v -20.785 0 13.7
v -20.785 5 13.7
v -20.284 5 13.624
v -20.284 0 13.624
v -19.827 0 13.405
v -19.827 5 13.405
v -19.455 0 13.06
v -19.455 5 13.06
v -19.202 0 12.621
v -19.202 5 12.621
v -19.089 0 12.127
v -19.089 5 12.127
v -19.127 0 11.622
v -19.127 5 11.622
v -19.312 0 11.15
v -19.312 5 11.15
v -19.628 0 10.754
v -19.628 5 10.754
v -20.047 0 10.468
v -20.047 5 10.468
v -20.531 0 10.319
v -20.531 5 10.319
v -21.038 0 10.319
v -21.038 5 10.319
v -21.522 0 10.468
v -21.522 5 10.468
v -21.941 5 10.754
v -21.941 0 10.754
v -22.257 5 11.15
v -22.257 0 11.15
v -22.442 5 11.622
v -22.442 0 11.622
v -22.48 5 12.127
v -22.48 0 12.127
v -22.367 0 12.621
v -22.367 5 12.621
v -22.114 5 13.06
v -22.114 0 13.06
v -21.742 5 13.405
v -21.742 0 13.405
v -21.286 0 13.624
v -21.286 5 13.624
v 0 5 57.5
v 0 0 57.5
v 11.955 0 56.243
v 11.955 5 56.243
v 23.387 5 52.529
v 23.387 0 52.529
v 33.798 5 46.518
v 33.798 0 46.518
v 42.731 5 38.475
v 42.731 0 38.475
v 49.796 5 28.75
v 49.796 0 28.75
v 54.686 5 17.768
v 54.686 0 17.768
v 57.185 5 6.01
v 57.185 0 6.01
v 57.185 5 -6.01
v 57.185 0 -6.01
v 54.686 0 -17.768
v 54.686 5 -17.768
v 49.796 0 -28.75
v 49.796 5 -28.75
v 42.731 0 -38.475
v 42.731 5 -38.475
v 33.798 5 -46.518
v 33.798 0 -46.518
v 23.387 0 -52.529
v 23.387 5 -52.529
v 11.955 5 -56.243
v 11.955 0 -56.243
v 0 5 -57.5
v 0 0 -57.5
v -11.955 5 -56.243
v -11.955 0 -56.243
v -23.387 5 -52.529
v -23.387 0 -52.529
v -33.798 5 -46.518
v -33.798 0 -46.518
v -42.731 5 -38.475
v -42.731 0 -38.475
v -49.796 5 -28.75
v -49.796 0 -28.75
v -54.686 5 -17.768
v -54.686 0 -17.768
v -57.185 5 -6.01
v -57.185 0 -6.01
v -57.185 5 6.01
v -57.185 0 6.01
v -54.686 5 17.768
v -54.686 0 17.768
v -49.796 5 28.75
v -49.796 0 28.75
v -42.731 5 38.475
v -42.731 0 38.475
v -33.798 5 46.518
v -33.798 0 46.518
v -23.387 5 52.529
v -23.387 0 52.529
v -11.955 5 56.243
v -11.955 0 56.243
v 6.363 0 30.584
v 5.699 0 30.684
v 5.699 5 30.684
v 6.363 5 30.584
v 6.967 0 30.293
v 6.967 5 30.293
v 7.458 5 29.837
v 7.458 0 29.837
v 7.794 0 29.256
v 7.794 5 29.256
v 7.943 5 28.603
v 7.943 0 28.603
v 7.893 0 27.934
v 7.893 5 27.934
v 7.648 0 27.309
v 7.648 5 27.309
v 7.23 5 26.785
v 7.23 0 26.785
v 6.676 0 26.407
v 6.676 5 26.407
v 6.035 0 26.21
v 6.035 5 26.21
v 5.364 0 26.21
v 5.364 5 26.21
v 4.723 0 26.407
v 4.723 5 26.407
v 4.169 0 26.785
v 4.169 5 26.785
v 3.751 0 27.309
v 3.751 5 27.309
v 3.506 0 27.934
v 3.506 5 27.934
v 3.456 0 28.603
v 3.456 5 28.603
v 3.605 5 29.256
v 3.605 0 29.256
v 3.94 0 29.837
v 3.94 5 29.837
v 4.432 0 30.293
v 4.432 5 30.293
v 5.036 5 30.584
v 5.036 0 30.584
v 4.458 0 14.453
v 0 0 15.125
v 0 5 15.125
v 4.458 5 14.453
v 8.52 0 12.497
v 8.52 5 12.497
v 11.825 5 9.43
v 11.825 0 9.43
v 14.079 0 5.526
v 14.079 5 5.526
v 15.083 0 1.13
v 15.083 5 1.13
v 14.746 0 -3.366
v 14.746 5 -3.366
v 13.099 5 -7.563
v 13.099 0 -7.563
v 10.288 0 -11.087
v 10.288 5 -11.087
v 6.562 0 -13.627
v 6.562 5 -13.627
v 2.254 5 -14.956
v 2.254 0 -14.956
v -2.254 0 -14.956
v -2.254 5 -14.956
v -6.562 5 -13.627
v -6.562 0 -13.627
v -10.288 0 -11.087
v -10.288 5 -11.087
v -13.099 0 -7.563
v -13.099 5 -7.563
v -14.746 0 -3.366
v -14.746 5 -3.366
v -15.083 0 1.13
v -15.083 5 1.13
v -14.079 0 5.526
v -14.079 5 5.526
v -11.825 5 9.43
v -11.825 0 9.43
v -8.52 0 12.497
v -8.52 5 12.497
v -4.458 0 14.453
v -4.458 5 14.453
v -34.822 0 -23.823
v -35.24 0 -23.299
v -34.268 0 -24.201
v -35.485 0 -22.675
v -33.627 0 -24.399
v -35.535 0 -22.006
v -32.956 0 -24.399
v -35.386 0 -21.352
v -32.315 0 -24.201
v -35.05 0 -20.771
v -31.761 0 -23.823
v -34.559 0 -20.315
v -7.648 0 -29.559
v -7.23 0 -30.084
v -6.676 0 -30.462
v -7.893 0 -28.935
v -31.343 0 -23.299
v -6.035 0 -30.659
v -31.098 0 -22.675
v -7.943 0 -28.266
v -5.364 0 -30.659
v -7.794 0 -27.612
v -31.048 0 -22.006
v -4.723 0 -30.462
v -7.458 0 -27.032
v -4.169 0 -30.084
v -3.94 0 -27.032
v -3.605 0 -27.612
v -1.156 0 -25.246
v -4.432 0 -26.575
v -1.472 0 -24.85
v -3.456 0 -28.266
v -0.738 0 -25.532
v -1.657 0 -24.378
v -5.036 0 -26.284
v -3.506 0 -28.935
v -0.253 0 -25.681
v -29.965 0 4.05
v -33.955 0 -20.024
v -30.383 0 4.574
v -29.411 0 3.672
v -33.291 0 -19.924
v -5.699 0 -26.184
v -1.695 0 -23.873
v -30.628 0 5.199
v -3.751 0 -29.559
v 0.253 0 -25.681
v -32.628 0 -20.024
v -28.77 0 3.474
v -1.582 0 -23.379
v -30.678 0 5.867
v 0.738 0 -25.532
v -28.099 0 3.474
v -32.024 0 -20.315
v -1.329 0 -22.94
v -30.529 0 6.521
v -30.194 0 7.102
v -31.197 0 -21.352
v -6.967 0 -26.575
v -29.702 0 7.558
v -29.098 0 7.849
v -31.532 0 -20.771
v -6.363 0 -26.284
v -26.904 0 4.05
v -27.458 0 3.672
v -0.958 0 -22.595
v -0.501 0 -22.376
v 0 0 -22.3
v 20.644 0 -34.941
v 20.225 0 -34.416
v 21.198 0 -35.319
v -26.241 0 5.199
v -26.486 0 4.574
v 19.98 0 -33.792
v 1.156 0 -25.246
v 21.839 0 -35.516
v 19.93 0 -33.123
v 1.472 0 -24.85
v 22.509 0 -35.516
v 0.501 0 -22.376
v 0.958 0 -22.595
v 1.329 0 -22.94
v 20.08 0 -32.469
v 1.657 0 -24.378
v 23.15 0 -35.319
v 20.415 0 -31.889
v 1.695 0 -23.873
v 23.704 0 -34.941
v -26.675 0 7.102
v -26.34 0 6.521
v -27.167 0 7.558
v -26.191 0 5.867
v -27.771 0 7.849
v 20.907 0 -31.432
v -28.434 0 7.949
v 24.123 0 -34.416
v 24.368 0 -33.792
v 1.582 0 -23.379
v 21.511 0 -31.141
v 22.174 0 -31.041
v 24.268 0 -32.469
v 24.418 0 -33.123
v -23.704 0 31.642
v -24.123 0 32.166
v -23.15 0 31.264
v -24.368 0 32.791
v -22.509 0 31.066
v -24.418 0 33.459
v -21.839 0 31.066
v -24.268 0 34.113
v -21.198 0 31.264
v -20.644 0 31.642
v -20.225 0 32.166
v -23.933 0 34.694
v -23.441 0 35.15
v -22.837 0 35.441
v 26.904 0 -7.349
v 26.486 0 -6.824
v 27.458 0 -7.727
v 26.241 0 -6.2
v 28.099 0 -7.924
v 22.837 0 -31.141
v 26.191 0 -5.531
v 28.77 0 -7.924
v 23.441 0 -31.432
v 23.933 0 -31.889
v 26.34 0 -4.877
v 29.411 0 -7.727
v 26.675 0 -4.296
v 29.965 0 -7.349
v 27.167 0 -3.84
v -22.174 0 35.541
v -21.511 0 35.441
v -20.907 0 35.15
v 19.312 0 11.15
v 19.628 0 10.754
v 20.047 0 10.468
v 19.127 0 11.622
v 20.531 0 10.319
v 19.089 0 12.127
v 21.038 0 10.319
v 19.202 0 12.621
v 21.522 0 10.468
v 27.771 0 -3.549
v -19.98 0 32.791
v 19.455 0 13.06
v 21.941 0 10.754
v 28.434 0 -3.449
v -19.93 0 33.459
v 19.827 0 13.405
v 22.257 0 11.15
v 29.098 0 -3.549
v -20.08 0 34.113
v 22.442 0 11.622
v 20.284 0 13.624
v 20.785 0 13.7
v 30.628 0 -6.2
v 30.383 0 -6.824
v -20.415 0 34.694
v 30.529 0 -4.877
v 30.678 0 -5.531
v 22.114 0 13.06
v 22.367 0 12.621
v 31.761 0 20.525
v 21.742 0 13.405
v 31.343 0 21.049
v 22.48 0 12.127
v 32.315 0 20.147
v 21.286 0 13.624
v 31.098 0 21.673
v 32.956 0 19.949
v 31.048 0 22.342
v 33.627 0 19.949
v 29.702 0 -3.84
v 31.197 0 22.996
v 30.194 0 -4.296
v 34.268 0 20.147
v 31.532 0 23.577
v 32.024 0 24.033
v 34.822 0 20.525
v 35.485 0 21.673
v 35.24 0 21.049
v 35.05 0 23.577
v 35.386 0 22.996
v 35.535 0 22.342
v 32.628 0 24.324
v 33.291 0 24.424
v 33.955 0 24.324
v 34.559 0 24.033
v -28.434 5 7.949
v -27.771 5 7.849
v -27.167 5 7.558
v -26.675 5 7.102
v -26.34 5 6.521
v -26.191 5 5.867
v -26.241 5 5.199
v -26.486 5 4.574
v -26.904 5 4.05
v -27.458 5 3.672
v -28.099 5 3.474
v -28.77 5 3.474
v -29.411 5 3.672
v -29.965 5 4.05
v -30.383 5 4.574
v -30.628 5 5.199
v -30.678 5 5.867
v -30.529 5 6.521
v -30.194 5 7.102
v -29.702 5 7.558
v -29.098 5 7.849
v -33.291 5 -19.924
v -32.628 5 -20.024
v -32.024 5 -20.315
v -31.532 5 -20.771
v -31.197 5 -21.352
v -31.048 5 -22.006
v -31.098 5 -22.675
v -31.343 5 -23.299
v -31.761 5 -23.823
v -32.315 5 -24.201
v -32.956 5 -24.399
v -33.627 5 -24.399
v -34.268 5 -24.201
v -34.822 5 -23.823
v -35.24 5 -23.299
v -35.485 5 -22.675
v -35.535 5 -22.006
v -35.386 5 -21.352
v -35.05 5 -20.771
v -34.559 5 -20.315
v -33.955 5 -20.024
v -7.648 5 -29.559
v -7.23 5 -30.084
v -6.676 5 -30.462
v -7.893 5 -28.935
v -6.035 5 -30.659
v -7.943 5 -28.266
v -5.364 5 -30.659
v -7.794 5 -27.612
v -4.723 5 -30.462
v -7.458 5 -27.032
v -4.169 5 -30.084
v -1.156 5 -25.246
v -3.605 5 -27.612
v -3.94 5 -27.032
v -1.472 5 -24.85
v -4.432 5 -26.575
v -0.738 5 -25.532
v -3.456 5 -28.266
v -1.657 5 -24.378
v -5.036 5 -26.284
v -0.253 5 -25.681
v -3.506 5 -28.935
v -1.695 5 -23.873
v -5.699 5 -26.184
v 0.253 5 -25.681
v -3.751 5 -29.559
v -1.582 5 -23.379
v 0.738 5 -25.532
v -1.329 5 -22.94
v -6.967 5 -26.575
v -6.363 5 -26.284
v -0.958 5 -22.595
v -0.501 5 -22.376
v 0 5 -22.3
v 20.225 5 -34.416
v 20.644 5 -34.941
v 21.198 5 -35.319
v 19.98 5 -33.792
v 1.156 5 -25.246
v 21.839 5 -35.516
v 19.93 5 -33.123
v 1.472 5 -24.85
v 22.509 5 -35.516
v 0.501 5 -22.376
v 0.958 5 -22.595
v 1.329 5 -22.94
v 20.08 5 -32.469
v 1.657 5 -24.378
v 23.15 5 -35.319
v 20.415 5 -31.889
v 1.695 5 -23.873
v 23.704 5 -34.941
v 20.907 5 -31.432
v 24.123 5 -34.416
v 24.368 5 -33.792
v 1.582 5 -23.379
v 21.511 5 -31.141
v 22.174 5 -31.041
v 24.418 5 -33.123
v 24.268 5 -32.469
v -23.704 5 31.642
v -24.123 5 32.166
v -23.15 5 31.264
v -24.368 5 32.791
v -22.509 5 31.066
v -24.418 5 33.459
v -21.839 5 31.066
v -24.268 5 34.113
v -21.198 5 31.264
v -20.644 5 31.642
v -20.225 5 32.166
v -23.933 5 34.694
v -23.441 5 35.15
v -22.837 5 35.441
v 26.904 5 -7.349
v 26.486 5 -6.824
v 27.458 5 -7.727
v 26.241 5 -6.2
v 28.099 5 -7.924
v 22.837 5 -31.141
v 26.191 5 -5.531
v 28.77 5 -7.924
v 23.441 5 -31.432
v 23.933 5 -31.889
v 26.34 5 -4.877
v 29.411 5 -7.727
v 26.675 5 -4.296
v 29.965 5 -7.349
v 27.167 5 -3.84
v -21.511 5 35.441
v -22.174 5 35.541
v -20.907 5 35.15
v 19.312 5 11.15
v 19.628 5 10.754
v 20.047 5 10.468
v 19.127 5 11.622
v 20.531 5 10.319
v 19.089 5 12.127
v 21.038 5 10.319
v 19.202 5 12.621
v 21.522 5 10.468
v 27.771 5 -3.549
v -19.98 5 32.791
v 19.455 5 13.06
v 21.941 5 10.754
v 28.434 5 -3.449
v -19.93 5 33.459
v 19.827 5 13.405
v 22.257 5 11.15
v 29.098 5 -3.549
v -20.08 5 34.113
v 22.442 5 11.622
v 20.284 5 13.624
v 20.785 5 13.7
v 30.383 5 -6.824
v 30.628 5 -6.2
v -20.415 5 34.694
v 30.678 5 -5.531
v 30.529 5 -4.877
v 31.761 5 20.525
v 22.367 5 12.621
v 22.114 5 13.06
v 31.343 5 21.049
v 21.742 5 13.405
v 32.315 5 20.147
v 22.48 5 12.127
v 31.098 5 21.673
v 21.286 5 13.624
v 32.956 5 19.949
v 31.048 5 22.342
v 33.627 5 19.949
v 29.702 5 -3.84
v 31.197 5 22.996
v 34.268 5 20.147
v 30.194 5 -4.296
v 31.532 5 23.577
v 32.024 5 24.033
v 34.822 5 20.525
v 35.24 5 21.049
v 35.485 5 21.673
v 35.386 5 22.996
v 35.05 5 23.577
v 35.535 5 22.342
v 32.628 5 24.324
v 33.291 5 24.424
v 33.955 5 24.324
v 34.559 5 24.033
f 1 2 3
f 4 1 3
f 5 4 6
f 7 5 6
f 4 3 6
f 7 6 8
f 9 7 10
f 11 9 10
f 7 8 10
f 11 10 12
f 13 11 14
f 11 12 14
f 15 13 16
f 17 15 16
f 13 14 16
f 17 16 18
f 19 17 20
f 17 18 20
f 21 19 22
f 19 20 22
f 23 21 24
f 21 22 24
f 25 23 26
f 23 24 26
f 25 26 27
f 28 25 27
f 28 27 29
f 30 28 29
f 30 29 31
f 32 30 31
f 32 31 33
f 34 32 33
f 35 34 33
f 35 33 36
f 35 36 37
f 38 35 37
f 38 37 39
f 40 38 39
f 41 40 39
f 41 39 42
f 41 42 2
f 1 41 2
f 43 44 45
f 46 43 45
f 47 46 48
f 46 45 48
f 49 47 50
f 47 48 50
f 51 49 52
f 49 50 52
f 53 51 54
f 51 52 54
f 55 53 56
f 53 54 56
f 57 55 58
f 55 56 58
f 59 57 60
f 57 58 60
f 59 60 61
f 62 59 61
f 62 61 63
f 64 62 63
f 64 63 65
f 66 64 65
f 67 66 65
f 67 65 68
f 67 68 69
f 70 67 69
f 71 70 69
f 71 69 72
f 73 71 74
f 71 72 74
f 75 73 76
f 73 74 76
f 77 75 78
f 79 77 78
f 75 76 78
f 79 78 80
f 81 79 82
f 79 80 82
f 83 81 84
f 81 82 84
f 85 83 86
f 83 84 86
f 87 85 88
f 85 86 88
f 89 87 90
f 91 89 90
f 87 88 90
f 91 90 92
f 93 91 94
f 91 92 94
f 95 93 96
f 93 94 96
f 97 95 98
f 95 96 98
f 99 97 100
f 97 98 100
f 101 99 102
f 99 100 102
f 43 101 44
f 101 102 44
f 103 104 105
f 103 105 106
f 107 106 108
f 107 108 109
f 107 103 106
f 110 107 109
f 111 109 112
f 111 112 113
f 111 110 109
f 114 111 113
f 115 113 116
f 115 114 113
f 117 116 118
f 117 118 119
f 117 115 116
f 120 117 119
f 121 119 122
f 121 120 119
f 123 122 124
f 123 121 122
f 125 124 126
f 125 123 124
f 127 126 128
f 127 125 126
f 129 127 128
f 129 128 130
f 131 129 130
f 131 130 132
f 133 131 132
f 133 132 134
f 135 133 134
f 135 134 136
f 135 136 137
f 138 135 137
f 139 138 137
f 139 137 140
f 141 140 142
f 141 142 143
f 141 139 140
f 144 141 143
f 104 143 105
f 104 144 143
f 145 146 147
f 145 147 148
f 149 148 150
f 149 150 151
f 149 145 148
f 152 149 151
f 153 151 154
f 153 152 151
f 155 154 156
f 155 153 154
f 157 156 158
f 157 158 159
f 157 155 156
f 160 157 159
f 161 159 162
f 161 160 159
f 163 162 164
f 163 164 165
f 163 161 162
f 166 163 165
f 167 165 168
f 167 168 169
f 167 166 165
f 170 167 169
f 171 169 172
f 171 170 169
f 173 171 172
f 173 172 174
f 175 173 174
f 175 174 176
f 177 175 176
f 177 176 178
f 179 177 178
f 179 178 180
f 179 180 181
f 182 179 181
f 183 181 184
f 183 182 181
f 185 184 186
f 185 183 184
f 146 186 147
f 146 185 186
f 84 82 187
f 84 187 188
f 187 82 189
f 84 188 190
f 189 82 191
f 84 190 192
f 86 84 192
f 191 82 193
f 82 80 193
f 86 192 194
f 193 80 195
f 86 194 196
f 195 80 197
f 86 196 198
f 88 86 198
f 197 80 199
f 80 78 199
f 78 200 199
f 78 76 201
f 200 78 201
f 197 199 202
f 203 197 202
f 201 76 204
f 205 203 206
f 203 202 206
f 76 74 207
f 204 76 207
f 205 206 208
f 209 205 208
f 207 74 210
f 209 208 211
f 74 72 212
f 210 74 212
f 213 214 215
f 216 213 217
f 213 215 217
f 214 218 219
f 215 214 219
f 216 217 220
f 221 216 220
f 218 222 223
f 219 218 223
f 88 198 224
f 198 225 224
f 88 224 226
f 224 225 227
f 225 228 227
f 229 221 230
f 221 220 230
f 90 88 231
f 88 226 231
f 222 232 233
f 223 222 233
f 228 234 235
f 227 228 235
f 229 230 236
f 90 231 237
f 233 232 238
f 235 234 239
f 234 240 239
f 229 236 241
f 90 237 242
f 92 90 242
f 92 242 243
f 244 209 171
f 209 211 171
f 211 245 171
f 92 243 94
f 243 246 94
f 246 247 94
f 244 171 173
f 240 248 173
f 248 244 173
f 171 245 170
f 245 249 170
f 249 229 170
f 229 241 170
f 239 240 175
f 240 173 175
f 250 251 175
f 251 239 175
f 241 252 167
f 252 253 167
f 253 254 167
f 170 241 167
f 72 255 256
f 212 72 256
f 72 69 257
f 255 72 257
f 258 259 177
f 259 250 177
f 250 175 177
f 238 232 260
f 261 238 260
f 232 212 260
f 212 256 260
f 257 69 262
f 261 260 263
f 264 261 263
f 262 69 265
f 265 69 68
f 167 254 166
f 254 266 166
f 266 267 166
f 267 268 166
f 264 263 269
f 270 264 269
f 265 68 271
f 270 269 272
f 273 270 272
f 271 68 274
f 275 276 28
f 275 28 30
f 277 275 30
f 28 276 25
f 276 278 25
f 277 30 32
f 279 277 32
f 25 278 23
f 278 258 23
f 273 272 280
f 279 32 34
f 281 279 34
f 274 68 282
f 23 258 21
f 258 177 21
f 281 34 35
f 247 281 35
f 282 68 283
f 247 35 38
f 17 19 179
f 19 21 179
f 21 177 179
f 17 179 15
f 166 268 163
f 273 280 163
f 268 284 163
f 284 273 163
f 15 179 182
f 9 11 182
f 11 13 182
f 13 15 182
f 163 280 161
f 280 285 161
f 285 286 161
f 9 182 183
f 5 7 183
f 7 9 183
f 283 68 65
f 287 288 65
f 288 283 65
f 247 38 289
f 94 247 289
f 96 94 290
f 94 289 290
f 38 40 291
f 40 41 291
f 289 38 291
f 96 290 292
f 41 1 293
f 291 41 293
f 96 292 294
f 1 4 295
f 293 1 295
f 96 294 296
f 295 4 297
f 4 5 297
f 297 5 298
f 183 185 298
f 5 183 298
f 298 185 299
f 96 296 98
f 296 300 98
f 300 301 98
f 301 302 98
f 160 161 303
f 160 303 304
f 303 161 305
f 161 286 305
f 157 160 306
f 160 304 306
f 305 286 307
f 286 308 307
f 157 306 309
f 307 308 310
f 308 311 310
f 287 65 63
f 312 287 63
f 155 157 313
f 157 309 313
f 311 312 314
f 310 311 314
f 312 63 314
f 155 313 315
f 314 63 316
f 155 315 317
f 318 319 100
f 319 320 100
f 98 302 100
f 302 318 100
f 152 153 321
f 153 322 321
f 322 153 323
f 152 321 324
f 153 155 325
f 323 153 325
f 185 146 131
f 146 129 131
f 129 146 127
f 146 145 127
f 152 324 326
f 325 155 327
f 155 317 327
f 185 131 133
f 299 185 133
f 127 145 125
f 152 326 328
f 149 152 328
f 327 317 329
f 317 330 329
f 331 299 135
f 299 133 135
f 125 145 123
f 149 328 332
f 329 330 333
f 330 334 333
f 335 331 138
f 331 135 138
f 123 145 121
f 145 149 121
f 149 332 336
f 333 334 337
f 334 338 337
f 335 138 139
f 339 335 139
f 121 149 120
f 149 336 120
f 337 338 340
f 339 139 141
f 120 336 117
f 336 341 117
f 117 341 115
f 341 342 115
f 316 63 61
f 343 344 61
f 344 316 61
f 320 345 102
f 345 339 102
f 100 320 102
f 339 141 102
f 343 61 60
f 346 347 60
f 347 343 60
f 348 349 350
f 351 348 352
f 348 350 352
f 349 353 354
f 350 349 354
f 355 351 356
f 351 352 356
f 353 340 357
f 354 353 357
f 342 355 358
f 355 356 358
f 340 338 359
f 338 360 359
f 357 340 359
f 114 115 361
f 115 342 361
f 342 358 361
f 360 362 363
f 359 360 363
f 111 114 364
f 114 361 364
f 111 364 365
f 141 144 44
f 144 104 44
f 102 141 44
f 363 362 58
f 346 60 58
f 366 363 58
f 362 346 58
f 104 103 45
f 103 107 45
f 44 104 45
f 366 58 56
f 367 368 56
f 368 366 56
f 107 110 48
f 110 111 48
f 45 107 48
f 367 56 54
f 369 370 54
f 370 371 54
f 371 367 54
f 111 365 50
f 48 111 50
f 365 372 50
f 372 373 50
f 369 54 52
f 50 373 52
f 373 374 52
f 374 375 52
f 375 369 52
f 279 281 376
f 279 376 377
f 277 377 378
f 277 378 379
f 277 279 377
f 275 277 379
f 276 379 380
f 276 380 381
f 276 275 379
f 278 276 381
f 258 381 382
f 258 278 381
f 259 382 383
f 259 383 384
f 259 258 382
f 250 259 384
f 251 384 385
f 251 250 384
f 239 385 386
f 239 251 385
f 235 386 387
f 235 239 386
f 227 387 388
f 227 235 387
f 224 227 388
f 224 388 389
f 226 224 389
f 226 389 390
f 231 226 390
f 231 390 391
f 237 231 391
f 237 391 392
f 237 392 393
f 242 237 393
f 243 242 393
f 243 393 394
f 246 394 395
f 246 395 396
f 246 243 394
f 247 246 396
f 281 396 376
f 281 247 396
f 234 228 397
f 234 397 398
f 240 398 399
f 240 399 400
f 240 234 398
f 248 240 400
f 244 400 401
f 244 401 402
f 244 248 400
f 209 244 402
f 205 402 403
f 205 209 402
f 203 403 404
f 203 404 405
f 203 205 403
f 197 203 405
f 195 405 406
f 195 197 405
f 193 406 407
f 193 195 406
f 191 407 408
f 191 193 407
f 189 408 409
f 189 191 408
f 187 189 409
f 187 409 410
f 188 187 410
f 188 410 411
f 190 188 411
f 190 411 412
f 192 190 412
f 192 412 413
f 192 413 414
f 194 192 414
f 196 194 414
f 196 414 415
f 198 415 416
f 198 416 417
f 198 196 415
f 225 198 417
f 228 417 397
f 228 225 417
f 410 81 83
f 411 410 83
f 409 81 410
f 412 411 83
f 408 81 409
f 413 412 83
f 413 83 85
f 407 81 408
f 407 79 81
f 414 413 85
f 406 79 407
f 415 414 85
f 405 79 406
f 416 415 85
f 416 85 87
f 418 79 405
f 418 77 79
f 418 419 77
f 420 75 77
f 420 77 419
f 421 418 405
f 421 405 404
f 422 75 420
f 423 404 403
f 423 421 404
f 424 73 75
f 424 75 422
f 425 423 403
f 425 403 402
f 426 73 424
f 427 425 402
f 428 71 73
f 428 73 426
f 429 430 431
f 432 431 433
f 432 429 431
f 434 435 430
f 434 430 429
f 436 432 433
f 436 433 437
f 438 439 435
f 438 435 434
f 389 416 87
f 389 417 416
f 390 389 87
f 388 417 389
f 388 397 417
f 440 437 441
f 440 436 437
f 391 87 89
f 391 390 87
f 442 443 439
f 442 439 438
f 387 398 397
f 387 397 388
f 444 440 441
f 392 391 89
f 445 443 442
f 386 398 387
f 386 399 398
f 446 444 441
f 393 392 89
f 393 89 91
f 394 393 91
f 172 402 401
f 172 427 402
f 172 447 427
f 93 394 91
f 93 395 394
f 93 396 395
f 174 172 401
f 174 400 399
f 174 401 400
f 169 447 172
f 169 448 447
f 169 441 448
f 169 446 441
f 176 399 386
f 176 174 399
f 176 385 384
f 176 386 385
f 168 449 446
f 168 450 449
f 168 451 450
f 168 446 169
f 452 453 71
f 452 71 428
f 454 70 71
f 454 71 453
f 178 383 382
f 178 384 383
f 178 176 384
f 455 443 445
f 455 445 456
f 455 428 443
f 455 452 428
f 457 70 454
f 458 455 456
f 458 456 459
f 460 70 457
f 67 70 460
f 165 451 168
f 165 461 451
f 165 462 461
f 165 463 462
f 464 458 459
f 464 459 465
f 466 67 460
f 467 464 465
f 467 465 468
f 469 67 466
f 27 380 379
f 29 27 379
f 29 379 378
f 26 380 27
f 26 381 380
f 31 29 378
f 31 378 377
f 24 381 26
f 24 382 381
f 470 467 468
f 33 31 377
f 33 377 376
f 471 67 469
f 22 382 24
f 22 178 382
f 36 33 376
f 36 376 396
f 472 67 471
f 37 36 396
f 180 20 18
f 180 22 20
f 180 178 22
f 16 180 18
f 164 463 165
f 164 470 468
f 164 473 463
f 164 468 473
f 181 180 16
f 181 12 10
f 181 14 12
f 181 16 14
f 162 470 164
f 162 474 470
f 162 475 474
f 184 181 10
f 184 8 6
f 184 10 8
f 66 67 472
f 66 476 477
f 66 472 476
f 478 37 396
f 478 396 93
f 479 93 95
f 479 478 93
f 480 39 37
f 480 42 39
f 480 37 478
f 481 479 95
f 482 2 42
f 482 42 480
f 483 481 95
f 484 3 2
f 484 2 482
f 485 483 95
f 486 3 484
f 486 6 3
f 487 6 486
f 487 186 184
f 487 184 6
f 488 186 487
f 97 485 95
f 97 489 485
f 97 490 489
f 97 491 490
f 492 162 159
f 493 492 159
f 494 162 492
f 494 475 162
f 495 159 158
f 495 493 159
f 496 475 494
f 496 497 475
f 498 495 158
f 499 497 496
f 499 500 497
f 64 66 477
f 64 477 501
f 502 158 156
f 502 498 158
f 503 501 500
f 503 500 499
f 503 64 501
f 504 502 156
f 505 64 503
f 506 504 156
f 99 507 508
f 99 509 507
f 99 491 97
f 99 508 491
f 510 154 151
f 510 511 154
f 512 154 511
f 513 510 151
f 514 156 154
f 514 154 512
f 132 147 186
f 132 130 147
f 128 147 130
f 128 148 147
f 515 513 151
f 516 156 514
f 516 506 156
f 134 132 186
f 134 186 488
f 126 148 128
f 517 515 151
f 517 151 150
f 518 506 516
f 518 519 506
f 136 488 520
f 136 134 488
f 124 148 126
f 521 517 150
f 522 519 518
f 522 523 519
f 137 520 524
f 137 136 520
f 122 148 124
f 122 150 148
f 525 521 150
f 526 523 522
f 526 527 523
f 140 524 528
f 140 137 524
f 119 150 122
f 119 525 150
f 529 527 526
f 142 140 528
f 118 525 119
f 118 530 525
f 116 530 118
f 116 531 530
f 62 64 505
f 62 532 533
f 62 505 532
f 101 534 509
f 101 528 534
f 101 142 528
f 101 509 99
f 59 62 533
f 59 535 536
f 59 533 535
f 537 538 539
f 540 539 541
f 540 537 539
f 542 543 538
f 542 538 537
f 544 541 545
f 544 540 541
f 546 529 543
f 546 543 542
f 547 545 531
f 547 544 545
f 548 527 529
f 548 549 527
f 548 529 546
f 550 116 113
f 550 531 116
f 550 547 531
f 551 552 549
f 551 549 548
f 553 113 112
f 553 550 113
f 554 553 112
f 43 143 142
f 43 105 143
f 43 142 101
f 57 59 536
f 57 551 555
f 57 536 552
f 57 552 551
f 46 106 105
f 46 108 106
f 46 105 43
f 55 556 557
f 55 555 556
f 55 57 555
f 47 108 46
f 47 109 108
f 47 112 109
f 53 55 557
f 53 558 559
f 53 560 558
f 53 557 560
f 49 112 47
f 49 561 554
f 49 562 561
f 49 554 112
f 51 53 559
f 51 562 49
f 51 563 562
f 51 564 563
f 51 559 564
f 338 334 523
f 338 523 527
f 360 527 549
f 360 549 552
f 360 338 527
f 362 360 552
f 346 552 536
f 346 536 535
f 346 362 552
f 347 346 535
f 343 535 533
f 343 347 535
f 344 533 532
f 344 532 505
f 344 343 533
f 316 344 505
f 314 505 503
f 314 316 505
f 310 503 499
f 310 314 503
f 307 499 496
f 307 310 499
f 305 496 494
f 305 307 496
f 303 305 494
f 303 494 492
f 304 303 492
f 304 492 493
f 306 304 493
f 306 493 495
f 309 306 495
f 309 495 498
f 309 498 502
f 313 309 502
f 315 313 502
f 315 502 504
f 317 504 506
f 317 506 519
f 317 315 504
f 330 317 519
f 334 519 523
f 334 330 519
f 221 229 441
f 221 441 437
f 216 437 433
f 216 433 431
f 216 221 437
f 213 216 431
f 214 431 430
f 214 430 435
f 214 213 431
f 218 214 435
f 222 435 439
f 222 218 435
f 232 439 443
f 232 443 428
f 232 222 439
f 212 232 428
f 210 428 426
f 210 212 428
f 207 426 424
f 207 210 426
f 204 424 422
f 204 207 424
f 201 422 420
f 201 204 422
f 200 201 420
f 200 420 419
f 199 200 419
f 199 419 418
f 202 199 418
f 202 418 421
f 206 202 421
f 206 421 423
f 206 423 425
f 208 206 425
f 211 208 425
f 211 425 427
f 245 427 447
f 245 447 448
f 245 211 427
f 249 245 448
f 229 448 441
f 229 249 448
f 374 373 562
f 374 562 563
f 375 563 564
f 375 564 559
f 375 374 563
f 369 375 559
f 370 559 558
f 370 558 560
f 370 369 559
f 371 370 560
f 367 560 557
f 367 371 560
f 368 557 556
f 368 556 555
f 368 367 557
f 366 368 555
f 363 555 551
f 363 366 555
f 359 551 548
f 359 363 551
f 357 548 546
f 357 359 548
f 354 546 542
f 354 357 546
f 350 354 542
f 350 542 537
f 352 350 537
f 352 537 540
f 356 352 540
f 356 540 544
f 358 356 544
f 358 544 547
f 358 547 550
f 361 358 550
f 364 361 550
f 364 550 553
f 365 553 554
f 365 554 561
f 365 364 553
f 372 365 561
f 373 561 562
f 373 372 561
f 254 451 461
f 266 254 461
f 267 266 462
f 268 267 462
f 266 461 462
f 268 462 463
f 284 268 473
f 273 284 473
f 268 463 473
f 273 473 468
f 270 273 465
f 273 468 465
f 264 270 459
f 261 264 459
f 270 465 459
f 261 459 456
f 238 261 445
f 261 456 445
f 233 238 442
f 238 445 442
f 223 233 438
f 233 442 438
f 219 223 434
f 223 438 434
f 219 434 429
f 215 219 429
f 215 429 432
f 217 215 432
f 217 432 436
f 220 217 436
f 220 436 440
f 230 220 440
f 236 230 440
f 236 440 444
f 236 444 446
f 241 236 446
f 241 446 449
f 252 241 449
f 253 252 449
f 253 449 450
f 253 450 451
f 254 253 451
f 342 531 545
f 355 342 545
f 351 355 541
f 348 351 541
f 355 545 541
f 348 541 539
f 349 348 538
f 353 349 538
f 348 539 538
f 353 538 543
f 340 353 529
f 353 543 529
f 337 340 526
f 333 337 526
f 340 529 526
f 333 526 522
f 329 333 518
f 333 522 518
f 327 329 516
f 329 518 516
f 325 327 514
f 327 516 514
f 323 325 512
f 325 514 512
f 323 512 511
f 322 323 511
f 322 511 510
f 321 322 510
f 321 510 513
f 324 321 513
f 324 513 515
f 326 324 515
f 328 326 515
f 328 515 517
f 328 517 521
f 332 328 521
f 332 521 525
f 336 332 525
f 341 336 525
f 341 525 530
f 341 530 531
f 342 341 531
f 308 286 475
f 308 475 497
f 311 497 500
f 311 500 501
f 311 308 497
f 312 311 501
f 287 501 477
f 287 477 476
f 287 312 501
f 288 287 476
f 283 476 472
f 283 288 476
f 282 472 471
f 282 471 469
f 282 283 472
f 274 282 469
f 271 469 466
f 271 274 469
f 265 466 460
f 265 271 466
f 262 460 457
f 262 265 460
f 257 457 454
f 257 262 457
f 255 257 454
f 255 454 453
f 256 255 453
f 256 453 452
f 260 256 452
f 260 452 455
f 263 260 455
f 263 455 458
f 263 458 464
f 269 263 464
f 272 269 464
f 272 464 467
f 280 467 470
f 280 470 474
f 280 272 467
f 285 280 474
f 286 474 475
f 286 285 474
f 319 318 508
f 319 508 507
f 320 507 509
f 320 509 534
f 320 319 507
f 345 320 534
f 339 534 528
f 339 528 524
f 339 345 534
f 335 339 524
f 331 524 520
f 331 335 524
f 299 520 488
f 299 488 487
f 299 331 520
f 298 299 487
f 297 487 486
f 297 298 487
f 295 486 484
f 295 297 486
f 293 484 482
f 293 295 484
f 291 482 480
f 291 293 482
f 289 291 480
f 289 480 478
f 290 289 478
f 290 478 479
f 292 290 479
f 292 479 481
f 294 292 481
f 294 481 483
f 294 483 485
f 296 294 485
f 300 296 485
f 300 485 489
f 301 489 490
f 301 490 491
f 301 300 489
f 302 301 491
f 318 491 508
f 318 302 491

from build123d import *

# Parameters (mm, degrees)
SKETCH1_R           = 57.5
SKETCH1_R_2         = 15.125
SKETCH1_R_3         = 2.25
BOSS_EXTRUDE1_DEPTH = 5
SKETCH3_R           = 1.7
CUT_EXTRUDE1_DEPTH  = 82.470853684


with BuildPart() as part:
    # Sketch1 → Boss-Extrude1 (new body)
    with BuildSketch(Plane(origin=(0, 0, 0), x_dir=(1, 0, 0), z_dir=(0, 1, 0))):
        with Locations(Location((0, 0, 0), (0, 0, 270))):
            Circle(SKETCH1_R)
        with Locations(Location((0, 0, 0), (0, 0, 270))):
            Circle(SKETCH1_R_2, mode=Mode.SUBTRACT)
        with Locations(Location((5.699343677, -28.434441821, 0), (0, 0, 270))):
            Circle(SKETCH1_R_3, mode=Mode.SUBTRACT)
        with Locations(Location((33.29135337, -22.173989059, 0), (0, 0, 270))):
            Circle(SKETCH1_R_3, mode=Mode.SUBTRACT)
        with Locations(Location((-28.434441821, -5.699343677, 0), (0, 0, 270))):
            Circle(SKETCH1_R_3, mode=Mode.SUBTRACT)
        with Locations(Location((-22.173989059, -33.29135337, 0), (0, 0, 270))):
            Circle(SKETCH1_R_3, mode=Mode.SUBTRACT)
        with Locations(Location((-5.699343677, 28.434441821, 0), (0, 0, 270))):
            Circle(SKETCH1_R_3, mode=Mode.SUBTRACT)
        with Locations(Location((-33.29135337, 22.173989059, 0), (0, 0, 270))):
            Circle(SKETCH1_R_3, mode=Mode.SUBTRACT)
        with Locations(Location((28.434441821, 5.699343677, 0), (0, 0, 270))):
            Circle(SKETCH1_R_3, mode=Mode.SUBTRACT)
        with Locations(Location((22.173989059, 33.29135337, 0), (0, 0, 270))):
            Circle(SKETCH1_R_3, mode=Mode.SUBTRACT)
    extrude(amount=BOSS_EXTRUDE1_DEPTH)

    # Sketch3 → Cut-Extrude1 (cut, through all)
    with BuildSketch(Plane(origin=(0, 5, 0), x_dir=(1, 0, 0), z_dir=(0, 1, 0))):
        with Locations(Location((0, 24, 0), (0, 0, 270))):
            Circle(SKETCH3_R)
        with Locations(Location((20.784609691, -12, 0), (0, 0, 270))):
            Circle(SKETCH3_R)
        with Locations(Location((-20.784609691, -12, 0), (0, 0, 270))):
            Circle(SKETCH3_R)
    extrude(amount=-CUT_EXTRUDE1_DEPTH, mode=Mode.SUBTRACT)


solid = part.part
